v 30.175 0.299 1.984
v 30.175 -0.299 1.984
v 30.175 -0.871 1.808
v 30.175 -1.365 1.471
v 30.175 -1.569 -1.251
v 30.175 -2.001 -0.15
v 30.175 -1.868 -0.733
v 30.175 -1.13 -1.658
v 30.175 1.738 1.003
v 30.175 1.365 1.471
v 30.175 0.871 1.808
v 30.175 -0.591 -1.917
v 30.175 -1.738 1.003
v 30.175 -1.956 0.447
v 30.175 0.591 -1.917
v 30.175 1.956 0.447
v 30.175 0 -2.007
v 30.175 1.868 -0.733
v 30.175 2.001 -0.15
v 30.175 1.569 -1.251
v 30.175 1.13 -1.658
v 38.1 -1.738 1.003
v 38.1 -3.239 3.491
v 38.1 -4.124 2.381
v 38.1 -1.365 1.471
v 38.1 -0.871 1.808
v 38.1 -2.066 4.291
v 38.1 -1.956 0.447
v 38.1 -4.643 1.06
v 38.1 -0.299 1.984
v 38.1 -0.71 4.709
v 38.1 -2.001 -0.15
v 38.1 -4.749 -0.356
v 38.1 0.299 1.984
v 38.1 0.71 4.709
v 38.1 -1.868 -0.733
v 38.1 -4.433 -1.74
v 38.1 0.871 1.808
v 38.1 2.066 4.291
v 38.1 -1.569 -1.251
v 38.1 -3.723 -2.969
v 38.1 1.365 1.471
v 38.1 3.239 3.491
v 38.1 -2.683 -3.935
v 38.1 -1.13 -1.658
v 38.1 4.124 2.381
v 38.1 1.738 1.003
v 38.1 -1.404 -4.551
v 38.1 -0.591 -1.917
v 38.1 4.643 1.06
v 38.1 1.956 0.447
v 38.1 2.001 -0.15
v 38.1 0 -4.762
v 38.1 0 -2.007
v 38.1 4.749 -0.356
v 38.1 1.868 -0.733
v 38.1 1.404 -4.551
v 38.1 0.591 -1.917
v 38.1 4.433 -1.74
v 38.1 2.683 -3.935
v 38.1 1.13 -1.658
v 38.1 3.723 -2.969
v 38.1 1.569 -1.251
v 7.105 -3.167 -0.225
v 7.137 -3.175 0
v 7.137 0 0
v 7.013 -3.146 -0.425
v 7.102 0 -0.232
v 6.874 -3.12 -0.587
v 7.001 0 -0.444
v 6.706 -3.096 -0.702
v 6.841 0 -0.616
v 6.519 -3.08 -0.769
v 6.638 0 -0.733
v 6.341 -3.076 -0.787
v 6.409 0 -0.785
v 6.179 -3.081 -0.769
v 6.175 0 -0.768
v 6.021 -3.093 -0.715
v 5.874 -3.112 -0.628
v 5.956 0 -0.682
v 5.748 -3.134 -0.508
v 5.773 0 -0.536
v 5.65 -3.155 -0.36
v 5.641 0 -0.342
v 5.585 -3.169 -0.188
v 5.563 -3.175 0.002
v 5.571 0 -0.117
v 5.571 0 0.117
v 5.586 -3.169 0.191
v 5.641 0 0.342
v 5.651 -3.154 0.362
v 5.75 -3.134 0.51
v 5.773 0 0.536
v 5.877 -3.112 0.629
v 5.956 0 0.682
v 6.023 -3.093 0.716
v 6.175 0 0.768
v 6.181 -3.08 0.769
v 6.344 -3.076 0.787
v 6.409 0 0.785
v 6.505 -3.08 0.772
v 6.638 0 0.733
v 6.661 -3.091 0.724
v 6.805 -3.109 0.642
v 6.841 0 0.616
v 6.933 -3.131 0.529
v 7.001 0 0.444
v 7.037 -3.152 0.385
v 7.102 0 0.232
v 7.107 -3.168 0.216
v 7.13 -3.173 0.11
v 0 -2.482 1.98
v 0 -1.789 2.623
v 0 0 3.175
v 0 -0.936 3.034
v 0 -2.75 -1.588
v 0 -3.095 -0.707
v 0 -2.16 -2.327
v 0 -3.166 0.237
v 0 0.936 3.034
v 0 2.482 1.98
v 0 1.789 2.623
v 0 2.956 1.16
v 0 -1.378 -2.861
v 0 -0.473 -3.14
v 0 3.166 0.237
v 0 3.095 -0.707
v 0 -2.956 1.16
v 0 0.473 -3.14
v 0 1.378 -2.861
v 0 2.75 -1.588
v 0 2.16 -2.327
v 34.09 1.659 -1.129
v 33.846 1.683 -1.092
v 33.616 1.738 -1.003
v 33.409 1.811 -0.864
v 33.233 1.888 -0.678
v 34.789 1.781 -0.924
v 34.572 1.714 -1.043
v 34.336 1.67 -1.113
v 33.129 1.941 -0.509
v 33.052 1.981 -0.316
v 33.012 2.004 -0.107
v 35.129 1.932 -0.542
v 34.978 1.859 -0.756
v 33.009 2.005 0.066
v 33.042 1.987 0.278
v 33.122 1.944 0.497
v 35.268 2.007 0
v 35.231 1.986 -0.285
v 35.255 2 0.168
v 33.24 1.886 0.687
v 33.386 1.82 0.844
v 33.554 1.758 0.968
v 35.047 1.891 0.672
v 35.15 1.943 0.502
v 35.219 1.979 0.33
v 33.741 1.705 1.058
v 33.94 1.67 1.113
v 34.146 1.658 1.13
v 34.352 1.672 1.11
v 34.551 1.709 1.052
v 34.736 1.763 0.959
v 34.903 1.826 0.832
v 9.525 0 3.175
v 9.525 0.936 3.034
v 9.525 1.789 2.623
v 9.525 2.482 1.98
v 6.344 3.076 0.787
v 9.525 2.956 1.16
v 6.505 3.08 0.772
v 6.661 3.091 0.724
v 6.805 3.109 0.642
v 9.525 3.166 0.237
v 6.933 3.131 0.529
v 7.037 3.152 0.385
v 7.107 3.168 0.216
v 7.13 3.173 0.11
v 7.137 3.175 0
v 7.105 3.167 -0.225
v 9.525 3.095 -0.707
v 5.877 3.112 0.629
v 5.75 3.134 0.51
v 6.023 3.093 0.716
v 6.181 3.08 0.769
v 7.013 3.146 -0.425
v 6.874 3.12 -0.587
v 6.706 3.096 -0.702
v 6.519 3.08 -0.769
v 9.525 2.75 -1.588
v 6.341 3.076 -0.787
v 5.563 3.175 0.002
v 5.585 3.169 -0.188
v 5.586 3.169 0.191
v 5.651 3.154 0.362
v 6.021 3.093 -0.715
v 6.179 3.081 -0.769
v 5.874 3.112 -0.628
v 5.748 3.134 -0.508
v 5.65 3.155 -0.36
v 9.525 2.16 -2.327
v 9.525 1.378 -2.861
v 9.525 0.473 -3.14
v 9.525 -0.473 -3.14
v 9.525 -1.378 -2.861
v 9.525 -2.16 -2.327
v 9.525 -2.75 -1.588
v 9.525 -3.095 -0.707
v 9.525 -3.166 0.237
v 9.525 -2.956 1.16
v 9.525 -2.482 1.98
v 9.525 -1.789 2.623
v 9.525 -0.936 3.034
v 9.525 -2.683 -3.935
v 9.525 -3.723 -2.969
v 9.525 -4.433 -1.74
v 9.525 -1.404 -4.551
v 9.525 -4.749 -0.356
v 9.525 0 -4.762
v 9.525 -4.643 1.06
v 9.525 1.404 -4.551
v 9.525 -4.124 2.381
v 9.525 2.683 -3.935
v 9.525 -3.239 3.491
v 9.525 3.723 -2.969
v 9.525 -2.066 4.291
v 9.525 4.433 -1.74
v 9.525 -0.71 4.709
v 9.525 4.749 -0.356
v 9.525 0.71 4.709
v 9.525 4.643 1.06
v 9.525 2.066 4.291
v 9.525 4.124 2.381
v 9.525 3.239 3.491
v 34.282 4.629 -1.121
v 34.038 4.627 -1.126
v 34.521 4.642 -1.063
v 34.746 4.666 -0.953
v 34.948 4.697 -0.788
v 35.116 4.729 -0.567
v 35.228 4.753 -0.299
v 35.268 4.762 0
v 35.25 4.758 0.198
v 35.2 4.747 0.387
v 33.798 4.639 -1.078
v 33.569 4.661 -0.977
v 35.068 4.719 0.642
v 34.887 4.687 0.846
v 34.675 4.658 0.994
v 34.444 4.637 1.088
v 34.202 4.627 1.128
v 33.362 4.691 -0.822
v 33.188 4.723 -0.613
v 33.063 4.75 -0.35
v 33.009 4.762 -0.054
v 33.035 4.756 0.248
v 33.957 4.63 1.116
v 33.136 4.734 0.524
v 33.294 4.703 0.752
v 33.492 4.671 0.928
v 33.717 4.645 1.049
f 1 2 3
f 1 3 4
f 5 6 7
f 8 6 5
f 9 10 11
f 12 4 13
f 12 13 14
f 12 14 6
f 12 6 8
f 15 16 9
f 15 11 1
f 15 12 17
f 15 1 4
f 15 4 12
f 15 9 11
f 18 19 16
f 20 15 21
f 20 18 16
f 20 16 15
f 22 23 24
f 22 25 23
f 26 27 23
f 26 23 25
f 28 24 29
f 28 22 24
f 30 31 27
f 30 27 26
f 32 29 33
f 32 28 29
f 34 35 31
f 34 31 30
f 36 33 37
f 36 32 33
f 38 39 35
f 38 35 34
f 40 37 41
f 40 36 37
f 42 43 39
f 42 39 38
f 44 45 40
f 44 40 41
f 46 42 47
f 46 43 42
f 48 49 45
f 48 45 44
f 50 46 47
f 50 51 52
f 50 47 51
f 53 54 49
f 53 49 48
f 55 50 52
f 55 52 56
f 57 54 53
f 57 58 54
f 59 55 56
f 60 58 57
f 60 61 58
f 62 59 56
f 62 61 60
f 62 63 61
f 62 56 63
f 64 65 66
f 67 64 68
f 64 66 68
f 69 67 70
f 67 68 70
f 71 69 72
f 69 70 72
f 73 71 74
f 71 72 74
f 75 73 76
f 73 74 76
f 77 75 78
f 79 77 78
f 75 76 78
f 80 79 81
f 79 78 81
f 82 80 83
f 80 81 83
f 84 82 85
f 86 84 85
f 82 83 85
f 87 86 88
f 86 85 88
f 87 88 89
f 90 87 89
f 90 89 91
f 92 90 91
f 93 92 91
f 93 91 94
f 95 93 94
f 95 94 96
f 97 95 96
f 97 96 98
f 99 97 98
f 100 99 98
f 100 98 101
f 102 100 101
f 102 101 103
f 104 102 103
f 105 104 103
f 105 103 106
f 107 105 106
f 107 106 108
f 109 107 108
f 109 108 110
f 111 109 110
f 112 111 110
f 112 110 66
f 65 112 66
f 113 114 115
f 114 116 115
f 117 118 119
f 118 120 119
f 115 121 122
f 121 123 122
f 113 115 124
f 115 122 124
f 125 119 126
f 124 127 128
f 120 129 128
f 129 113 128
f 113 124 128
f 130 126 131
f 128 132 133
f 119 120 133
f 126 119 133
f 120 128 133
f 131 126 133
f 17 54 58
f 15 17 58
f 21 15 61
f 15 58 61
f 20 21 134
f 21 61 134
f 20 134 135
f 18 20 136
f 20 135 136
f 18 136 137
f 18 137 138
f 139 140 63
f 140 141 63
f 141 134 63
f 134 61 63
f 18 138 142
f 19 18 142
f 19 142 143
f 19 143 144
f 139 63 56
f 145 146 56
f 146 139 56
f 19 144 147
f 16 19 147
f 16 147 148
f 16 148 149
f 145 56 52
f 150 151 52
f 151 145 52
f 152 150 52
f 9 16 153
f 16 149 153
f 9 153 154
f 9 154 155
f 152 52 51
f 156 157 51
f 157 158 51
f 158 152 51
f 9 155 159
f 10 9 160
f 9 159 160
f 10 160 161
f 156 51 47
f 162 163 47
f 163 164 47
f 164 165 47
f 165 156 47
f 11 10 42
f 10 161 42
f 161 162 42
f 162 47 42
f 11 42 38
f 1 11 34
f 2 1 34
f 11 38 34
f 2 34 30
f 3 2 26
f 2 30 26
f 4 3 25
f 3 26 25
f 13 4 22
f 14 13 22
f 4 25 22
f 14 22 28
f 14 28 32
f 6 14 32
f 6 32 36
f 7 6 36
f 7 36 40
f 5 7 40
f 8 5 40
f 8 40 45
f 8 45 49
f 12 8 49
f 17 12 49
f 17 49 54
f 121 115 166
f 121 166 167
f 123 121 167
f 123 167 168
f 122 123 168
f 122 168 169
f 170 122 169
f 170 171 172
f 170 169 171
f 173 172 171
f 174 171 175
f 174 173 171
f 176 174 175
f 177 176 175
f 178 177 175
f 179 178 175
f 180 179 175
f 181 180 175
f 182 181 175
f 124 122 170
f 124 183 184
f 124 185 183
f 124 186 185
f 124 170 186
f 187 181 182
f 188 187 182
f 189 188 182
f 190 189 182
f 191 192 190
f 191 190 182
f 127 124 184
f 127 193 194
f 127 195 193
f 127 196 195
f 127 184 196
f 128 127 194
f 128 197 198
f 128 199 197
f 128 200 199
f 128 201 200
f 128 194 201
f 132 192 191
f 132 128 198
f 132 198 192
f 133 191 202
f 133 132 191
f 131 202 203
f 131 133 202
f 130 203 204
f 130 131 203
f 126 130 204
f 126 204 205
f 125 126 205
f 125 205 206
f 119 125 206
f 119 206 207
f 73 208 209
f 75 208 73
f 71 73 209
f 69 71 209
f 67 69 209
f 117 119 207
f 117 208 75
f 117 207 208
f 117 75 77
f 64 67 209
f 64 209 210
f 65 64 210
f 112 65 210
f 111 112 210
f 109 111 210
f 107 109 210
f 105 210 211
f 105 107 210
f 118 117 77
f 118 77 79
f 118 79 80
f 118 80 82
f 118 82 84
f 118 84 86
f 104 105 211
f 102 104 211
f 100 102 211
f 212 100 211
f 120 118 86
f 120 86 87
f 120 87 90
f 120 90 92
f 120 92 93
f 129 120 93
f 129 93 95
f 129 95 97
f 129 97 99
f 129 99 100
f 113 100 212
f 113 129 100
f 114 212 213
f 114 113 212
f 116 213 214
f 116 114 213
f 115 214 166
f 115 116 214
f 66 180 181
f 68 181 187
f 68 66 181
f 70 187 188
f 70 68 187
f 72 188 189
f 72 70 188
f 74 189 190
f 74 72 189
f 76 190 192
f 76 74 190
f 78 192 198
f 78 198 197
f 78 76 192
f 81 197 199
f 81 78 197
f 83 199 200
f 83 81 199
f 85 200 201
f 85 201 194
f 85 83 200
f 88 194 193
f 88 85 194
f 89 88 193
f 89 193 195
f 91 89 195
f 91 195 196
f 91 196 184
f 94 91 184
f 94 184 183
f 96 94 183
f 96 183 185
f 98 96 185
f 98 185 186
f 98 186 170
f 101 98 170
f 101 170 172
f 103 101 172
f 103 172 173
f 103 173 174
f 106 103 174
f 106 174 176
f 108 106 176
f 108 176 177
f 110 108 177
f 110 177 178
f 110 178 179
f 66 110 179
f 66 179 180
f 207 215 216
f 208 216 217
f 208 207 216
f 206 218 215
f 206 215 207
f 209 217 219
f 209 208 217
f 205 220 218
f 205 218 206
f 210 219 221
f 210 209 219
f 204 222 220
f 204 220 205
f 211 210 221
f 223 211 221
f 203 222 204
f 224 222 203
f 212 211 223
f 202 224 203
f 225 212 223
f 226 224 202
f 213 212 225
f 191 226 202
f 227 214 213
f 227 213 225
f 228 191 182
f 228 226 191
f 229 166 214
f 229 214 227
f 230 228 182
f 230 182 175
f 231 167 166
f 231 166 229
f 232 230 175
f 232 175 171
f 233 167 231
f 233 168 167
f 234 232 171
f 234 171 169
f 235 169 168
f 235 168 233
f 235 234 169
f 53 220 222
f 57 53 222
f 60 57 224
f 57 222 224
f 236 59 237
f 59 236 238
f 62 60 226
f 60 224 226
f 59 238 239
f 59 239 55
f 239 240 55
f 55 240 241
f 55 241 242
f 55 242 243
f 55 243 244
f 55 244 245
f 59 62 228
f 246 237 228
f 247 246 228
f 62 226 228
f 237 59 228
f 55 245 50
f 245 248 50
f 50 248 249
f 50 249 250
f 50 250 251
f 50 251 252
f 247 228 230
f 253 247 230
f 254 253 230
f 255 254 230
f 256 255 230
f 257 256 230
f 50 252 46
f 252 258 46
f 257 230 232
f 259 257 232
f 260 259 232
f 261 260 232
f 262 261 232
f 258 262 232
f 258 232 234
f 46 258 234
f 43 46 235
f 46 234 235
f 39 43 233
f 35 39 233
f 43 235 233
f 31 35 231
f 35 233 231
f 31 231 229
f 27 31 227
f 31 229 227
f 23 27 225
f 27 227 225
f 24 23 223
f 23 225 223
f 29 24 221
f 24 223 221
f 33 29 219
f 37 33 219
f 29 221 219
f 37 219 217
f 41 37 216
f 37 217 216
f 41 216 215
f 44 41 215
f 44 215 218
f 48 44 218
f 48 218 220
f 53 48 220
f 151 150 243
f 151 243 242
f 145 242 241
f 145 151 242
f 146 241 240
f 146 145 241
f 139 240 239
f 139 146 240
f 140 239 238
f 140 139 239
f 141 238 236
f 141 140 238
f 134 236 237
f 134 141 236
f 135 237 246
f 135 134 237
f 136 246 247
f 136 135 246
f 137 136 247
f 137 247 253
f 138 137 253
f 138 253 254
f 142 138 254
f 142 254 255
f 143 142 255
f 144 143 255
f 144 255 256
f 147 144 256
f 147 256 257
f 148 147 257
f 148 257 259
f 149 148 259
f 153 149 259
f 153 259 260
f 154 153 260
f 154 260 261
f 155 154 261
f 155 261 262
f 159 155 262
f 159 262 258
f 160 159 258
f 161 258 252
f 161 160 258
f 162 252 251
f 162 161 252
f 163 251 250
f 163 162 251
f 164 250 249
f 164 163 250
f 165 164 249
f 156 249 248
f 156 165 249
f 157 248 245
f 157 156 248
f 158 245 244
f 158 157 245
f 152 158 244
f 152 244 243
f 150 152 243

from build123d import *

# Parameters (mm, degrees)
SKETCH1_R               = 4.7625
BOSS_EXTRUDE1_DEPTH     = 38.1
SKETCH2_R               = 2.0066
CUT_EXTRUDE1_DEPTH      = 7.9248
SKETCH3_R               = 1.1303
CUT_EXTRUDE2_DEPTH      = 8.6868
SKETCH4_R               = 5.084796601
SKETCH4_R_2             = 3.175
CUT_EXTRUDE3_DEPTH      = 9.525
SKETCH5_R               = 0.7874
CUT_EXTRUDE4_DEPTH      = 5.762500124
CUT_EXTRUDE4_DEPTH_BACK = 5.7625001


with BuildPart() as part:
    # Sketch1 → Boss-Extrude1 (new body)
    with BuildSketch(Plane(origin=(0, 0, 0), x_dir=(0, 0, -1), z_dir=(1, 0, 0))):
        Circle(SKETCH1_R)
    extrude(amount=BOSS_EXTRUDE1_DEPTH)

    # Sketch2 → Cut-Extrude1 (cut)
    with BuildSketch(Plane(origin=(38.1, 0, 0), x_dir=(0, 0, -1), z_dir=(1, 0, 0))):
        Circle(SKETCH2_R)
    extrude(amount=-CUT_EXTRUDE1_DEPTH, mode=Mode.SUBTRACT)

    # Sketch3 → Cut-Extrude2 (cut)
    with BuildSketch(Plane(origin=(0, 0, 0), x_dir=(1, 0, 0), z_dir=(0, 1, 0))):
        with Locations((34.1376, 0)):
            Circle(SKETCH3_R)
    extrude(amount=CUT_EXTRUDE2_DEPTH, mode=Mode.SUBTRACT)

    # Sketch4 → Cut-Extrude3 (cut)
    with BuildSketch(Plane.ZY):
        Circle(SKETCH4_R)
        Circle(SKETCH4_R_2, mode=Mode.SUBTRACT)
    extrude(amount=-CUT_EXTRUDE3_DEPTH, mode=Mode.SUBTRACT)

    # Sketch5 → Cut-Extrude4 (cut, two sides)
    with BuildSketch(Plane(origin=(0, 0, 0), x_dir=(1, 0, 0), z_dir=(0, 1, 0))) as cut_extrude4_sk:
        with Locations((6.35, 0)):
            Circle(SKETCH5_R)
    extrude(amount=CUT_EXTRUDE4_DEPTH, mode=Mode.SUBTRACT)
    extrude(cut_extrude4_sk.sketch, amount=-CUT_EXTRUDE4_DEPTH_BACK, mode=Mode.SUBTRACT)


solid = part.part
